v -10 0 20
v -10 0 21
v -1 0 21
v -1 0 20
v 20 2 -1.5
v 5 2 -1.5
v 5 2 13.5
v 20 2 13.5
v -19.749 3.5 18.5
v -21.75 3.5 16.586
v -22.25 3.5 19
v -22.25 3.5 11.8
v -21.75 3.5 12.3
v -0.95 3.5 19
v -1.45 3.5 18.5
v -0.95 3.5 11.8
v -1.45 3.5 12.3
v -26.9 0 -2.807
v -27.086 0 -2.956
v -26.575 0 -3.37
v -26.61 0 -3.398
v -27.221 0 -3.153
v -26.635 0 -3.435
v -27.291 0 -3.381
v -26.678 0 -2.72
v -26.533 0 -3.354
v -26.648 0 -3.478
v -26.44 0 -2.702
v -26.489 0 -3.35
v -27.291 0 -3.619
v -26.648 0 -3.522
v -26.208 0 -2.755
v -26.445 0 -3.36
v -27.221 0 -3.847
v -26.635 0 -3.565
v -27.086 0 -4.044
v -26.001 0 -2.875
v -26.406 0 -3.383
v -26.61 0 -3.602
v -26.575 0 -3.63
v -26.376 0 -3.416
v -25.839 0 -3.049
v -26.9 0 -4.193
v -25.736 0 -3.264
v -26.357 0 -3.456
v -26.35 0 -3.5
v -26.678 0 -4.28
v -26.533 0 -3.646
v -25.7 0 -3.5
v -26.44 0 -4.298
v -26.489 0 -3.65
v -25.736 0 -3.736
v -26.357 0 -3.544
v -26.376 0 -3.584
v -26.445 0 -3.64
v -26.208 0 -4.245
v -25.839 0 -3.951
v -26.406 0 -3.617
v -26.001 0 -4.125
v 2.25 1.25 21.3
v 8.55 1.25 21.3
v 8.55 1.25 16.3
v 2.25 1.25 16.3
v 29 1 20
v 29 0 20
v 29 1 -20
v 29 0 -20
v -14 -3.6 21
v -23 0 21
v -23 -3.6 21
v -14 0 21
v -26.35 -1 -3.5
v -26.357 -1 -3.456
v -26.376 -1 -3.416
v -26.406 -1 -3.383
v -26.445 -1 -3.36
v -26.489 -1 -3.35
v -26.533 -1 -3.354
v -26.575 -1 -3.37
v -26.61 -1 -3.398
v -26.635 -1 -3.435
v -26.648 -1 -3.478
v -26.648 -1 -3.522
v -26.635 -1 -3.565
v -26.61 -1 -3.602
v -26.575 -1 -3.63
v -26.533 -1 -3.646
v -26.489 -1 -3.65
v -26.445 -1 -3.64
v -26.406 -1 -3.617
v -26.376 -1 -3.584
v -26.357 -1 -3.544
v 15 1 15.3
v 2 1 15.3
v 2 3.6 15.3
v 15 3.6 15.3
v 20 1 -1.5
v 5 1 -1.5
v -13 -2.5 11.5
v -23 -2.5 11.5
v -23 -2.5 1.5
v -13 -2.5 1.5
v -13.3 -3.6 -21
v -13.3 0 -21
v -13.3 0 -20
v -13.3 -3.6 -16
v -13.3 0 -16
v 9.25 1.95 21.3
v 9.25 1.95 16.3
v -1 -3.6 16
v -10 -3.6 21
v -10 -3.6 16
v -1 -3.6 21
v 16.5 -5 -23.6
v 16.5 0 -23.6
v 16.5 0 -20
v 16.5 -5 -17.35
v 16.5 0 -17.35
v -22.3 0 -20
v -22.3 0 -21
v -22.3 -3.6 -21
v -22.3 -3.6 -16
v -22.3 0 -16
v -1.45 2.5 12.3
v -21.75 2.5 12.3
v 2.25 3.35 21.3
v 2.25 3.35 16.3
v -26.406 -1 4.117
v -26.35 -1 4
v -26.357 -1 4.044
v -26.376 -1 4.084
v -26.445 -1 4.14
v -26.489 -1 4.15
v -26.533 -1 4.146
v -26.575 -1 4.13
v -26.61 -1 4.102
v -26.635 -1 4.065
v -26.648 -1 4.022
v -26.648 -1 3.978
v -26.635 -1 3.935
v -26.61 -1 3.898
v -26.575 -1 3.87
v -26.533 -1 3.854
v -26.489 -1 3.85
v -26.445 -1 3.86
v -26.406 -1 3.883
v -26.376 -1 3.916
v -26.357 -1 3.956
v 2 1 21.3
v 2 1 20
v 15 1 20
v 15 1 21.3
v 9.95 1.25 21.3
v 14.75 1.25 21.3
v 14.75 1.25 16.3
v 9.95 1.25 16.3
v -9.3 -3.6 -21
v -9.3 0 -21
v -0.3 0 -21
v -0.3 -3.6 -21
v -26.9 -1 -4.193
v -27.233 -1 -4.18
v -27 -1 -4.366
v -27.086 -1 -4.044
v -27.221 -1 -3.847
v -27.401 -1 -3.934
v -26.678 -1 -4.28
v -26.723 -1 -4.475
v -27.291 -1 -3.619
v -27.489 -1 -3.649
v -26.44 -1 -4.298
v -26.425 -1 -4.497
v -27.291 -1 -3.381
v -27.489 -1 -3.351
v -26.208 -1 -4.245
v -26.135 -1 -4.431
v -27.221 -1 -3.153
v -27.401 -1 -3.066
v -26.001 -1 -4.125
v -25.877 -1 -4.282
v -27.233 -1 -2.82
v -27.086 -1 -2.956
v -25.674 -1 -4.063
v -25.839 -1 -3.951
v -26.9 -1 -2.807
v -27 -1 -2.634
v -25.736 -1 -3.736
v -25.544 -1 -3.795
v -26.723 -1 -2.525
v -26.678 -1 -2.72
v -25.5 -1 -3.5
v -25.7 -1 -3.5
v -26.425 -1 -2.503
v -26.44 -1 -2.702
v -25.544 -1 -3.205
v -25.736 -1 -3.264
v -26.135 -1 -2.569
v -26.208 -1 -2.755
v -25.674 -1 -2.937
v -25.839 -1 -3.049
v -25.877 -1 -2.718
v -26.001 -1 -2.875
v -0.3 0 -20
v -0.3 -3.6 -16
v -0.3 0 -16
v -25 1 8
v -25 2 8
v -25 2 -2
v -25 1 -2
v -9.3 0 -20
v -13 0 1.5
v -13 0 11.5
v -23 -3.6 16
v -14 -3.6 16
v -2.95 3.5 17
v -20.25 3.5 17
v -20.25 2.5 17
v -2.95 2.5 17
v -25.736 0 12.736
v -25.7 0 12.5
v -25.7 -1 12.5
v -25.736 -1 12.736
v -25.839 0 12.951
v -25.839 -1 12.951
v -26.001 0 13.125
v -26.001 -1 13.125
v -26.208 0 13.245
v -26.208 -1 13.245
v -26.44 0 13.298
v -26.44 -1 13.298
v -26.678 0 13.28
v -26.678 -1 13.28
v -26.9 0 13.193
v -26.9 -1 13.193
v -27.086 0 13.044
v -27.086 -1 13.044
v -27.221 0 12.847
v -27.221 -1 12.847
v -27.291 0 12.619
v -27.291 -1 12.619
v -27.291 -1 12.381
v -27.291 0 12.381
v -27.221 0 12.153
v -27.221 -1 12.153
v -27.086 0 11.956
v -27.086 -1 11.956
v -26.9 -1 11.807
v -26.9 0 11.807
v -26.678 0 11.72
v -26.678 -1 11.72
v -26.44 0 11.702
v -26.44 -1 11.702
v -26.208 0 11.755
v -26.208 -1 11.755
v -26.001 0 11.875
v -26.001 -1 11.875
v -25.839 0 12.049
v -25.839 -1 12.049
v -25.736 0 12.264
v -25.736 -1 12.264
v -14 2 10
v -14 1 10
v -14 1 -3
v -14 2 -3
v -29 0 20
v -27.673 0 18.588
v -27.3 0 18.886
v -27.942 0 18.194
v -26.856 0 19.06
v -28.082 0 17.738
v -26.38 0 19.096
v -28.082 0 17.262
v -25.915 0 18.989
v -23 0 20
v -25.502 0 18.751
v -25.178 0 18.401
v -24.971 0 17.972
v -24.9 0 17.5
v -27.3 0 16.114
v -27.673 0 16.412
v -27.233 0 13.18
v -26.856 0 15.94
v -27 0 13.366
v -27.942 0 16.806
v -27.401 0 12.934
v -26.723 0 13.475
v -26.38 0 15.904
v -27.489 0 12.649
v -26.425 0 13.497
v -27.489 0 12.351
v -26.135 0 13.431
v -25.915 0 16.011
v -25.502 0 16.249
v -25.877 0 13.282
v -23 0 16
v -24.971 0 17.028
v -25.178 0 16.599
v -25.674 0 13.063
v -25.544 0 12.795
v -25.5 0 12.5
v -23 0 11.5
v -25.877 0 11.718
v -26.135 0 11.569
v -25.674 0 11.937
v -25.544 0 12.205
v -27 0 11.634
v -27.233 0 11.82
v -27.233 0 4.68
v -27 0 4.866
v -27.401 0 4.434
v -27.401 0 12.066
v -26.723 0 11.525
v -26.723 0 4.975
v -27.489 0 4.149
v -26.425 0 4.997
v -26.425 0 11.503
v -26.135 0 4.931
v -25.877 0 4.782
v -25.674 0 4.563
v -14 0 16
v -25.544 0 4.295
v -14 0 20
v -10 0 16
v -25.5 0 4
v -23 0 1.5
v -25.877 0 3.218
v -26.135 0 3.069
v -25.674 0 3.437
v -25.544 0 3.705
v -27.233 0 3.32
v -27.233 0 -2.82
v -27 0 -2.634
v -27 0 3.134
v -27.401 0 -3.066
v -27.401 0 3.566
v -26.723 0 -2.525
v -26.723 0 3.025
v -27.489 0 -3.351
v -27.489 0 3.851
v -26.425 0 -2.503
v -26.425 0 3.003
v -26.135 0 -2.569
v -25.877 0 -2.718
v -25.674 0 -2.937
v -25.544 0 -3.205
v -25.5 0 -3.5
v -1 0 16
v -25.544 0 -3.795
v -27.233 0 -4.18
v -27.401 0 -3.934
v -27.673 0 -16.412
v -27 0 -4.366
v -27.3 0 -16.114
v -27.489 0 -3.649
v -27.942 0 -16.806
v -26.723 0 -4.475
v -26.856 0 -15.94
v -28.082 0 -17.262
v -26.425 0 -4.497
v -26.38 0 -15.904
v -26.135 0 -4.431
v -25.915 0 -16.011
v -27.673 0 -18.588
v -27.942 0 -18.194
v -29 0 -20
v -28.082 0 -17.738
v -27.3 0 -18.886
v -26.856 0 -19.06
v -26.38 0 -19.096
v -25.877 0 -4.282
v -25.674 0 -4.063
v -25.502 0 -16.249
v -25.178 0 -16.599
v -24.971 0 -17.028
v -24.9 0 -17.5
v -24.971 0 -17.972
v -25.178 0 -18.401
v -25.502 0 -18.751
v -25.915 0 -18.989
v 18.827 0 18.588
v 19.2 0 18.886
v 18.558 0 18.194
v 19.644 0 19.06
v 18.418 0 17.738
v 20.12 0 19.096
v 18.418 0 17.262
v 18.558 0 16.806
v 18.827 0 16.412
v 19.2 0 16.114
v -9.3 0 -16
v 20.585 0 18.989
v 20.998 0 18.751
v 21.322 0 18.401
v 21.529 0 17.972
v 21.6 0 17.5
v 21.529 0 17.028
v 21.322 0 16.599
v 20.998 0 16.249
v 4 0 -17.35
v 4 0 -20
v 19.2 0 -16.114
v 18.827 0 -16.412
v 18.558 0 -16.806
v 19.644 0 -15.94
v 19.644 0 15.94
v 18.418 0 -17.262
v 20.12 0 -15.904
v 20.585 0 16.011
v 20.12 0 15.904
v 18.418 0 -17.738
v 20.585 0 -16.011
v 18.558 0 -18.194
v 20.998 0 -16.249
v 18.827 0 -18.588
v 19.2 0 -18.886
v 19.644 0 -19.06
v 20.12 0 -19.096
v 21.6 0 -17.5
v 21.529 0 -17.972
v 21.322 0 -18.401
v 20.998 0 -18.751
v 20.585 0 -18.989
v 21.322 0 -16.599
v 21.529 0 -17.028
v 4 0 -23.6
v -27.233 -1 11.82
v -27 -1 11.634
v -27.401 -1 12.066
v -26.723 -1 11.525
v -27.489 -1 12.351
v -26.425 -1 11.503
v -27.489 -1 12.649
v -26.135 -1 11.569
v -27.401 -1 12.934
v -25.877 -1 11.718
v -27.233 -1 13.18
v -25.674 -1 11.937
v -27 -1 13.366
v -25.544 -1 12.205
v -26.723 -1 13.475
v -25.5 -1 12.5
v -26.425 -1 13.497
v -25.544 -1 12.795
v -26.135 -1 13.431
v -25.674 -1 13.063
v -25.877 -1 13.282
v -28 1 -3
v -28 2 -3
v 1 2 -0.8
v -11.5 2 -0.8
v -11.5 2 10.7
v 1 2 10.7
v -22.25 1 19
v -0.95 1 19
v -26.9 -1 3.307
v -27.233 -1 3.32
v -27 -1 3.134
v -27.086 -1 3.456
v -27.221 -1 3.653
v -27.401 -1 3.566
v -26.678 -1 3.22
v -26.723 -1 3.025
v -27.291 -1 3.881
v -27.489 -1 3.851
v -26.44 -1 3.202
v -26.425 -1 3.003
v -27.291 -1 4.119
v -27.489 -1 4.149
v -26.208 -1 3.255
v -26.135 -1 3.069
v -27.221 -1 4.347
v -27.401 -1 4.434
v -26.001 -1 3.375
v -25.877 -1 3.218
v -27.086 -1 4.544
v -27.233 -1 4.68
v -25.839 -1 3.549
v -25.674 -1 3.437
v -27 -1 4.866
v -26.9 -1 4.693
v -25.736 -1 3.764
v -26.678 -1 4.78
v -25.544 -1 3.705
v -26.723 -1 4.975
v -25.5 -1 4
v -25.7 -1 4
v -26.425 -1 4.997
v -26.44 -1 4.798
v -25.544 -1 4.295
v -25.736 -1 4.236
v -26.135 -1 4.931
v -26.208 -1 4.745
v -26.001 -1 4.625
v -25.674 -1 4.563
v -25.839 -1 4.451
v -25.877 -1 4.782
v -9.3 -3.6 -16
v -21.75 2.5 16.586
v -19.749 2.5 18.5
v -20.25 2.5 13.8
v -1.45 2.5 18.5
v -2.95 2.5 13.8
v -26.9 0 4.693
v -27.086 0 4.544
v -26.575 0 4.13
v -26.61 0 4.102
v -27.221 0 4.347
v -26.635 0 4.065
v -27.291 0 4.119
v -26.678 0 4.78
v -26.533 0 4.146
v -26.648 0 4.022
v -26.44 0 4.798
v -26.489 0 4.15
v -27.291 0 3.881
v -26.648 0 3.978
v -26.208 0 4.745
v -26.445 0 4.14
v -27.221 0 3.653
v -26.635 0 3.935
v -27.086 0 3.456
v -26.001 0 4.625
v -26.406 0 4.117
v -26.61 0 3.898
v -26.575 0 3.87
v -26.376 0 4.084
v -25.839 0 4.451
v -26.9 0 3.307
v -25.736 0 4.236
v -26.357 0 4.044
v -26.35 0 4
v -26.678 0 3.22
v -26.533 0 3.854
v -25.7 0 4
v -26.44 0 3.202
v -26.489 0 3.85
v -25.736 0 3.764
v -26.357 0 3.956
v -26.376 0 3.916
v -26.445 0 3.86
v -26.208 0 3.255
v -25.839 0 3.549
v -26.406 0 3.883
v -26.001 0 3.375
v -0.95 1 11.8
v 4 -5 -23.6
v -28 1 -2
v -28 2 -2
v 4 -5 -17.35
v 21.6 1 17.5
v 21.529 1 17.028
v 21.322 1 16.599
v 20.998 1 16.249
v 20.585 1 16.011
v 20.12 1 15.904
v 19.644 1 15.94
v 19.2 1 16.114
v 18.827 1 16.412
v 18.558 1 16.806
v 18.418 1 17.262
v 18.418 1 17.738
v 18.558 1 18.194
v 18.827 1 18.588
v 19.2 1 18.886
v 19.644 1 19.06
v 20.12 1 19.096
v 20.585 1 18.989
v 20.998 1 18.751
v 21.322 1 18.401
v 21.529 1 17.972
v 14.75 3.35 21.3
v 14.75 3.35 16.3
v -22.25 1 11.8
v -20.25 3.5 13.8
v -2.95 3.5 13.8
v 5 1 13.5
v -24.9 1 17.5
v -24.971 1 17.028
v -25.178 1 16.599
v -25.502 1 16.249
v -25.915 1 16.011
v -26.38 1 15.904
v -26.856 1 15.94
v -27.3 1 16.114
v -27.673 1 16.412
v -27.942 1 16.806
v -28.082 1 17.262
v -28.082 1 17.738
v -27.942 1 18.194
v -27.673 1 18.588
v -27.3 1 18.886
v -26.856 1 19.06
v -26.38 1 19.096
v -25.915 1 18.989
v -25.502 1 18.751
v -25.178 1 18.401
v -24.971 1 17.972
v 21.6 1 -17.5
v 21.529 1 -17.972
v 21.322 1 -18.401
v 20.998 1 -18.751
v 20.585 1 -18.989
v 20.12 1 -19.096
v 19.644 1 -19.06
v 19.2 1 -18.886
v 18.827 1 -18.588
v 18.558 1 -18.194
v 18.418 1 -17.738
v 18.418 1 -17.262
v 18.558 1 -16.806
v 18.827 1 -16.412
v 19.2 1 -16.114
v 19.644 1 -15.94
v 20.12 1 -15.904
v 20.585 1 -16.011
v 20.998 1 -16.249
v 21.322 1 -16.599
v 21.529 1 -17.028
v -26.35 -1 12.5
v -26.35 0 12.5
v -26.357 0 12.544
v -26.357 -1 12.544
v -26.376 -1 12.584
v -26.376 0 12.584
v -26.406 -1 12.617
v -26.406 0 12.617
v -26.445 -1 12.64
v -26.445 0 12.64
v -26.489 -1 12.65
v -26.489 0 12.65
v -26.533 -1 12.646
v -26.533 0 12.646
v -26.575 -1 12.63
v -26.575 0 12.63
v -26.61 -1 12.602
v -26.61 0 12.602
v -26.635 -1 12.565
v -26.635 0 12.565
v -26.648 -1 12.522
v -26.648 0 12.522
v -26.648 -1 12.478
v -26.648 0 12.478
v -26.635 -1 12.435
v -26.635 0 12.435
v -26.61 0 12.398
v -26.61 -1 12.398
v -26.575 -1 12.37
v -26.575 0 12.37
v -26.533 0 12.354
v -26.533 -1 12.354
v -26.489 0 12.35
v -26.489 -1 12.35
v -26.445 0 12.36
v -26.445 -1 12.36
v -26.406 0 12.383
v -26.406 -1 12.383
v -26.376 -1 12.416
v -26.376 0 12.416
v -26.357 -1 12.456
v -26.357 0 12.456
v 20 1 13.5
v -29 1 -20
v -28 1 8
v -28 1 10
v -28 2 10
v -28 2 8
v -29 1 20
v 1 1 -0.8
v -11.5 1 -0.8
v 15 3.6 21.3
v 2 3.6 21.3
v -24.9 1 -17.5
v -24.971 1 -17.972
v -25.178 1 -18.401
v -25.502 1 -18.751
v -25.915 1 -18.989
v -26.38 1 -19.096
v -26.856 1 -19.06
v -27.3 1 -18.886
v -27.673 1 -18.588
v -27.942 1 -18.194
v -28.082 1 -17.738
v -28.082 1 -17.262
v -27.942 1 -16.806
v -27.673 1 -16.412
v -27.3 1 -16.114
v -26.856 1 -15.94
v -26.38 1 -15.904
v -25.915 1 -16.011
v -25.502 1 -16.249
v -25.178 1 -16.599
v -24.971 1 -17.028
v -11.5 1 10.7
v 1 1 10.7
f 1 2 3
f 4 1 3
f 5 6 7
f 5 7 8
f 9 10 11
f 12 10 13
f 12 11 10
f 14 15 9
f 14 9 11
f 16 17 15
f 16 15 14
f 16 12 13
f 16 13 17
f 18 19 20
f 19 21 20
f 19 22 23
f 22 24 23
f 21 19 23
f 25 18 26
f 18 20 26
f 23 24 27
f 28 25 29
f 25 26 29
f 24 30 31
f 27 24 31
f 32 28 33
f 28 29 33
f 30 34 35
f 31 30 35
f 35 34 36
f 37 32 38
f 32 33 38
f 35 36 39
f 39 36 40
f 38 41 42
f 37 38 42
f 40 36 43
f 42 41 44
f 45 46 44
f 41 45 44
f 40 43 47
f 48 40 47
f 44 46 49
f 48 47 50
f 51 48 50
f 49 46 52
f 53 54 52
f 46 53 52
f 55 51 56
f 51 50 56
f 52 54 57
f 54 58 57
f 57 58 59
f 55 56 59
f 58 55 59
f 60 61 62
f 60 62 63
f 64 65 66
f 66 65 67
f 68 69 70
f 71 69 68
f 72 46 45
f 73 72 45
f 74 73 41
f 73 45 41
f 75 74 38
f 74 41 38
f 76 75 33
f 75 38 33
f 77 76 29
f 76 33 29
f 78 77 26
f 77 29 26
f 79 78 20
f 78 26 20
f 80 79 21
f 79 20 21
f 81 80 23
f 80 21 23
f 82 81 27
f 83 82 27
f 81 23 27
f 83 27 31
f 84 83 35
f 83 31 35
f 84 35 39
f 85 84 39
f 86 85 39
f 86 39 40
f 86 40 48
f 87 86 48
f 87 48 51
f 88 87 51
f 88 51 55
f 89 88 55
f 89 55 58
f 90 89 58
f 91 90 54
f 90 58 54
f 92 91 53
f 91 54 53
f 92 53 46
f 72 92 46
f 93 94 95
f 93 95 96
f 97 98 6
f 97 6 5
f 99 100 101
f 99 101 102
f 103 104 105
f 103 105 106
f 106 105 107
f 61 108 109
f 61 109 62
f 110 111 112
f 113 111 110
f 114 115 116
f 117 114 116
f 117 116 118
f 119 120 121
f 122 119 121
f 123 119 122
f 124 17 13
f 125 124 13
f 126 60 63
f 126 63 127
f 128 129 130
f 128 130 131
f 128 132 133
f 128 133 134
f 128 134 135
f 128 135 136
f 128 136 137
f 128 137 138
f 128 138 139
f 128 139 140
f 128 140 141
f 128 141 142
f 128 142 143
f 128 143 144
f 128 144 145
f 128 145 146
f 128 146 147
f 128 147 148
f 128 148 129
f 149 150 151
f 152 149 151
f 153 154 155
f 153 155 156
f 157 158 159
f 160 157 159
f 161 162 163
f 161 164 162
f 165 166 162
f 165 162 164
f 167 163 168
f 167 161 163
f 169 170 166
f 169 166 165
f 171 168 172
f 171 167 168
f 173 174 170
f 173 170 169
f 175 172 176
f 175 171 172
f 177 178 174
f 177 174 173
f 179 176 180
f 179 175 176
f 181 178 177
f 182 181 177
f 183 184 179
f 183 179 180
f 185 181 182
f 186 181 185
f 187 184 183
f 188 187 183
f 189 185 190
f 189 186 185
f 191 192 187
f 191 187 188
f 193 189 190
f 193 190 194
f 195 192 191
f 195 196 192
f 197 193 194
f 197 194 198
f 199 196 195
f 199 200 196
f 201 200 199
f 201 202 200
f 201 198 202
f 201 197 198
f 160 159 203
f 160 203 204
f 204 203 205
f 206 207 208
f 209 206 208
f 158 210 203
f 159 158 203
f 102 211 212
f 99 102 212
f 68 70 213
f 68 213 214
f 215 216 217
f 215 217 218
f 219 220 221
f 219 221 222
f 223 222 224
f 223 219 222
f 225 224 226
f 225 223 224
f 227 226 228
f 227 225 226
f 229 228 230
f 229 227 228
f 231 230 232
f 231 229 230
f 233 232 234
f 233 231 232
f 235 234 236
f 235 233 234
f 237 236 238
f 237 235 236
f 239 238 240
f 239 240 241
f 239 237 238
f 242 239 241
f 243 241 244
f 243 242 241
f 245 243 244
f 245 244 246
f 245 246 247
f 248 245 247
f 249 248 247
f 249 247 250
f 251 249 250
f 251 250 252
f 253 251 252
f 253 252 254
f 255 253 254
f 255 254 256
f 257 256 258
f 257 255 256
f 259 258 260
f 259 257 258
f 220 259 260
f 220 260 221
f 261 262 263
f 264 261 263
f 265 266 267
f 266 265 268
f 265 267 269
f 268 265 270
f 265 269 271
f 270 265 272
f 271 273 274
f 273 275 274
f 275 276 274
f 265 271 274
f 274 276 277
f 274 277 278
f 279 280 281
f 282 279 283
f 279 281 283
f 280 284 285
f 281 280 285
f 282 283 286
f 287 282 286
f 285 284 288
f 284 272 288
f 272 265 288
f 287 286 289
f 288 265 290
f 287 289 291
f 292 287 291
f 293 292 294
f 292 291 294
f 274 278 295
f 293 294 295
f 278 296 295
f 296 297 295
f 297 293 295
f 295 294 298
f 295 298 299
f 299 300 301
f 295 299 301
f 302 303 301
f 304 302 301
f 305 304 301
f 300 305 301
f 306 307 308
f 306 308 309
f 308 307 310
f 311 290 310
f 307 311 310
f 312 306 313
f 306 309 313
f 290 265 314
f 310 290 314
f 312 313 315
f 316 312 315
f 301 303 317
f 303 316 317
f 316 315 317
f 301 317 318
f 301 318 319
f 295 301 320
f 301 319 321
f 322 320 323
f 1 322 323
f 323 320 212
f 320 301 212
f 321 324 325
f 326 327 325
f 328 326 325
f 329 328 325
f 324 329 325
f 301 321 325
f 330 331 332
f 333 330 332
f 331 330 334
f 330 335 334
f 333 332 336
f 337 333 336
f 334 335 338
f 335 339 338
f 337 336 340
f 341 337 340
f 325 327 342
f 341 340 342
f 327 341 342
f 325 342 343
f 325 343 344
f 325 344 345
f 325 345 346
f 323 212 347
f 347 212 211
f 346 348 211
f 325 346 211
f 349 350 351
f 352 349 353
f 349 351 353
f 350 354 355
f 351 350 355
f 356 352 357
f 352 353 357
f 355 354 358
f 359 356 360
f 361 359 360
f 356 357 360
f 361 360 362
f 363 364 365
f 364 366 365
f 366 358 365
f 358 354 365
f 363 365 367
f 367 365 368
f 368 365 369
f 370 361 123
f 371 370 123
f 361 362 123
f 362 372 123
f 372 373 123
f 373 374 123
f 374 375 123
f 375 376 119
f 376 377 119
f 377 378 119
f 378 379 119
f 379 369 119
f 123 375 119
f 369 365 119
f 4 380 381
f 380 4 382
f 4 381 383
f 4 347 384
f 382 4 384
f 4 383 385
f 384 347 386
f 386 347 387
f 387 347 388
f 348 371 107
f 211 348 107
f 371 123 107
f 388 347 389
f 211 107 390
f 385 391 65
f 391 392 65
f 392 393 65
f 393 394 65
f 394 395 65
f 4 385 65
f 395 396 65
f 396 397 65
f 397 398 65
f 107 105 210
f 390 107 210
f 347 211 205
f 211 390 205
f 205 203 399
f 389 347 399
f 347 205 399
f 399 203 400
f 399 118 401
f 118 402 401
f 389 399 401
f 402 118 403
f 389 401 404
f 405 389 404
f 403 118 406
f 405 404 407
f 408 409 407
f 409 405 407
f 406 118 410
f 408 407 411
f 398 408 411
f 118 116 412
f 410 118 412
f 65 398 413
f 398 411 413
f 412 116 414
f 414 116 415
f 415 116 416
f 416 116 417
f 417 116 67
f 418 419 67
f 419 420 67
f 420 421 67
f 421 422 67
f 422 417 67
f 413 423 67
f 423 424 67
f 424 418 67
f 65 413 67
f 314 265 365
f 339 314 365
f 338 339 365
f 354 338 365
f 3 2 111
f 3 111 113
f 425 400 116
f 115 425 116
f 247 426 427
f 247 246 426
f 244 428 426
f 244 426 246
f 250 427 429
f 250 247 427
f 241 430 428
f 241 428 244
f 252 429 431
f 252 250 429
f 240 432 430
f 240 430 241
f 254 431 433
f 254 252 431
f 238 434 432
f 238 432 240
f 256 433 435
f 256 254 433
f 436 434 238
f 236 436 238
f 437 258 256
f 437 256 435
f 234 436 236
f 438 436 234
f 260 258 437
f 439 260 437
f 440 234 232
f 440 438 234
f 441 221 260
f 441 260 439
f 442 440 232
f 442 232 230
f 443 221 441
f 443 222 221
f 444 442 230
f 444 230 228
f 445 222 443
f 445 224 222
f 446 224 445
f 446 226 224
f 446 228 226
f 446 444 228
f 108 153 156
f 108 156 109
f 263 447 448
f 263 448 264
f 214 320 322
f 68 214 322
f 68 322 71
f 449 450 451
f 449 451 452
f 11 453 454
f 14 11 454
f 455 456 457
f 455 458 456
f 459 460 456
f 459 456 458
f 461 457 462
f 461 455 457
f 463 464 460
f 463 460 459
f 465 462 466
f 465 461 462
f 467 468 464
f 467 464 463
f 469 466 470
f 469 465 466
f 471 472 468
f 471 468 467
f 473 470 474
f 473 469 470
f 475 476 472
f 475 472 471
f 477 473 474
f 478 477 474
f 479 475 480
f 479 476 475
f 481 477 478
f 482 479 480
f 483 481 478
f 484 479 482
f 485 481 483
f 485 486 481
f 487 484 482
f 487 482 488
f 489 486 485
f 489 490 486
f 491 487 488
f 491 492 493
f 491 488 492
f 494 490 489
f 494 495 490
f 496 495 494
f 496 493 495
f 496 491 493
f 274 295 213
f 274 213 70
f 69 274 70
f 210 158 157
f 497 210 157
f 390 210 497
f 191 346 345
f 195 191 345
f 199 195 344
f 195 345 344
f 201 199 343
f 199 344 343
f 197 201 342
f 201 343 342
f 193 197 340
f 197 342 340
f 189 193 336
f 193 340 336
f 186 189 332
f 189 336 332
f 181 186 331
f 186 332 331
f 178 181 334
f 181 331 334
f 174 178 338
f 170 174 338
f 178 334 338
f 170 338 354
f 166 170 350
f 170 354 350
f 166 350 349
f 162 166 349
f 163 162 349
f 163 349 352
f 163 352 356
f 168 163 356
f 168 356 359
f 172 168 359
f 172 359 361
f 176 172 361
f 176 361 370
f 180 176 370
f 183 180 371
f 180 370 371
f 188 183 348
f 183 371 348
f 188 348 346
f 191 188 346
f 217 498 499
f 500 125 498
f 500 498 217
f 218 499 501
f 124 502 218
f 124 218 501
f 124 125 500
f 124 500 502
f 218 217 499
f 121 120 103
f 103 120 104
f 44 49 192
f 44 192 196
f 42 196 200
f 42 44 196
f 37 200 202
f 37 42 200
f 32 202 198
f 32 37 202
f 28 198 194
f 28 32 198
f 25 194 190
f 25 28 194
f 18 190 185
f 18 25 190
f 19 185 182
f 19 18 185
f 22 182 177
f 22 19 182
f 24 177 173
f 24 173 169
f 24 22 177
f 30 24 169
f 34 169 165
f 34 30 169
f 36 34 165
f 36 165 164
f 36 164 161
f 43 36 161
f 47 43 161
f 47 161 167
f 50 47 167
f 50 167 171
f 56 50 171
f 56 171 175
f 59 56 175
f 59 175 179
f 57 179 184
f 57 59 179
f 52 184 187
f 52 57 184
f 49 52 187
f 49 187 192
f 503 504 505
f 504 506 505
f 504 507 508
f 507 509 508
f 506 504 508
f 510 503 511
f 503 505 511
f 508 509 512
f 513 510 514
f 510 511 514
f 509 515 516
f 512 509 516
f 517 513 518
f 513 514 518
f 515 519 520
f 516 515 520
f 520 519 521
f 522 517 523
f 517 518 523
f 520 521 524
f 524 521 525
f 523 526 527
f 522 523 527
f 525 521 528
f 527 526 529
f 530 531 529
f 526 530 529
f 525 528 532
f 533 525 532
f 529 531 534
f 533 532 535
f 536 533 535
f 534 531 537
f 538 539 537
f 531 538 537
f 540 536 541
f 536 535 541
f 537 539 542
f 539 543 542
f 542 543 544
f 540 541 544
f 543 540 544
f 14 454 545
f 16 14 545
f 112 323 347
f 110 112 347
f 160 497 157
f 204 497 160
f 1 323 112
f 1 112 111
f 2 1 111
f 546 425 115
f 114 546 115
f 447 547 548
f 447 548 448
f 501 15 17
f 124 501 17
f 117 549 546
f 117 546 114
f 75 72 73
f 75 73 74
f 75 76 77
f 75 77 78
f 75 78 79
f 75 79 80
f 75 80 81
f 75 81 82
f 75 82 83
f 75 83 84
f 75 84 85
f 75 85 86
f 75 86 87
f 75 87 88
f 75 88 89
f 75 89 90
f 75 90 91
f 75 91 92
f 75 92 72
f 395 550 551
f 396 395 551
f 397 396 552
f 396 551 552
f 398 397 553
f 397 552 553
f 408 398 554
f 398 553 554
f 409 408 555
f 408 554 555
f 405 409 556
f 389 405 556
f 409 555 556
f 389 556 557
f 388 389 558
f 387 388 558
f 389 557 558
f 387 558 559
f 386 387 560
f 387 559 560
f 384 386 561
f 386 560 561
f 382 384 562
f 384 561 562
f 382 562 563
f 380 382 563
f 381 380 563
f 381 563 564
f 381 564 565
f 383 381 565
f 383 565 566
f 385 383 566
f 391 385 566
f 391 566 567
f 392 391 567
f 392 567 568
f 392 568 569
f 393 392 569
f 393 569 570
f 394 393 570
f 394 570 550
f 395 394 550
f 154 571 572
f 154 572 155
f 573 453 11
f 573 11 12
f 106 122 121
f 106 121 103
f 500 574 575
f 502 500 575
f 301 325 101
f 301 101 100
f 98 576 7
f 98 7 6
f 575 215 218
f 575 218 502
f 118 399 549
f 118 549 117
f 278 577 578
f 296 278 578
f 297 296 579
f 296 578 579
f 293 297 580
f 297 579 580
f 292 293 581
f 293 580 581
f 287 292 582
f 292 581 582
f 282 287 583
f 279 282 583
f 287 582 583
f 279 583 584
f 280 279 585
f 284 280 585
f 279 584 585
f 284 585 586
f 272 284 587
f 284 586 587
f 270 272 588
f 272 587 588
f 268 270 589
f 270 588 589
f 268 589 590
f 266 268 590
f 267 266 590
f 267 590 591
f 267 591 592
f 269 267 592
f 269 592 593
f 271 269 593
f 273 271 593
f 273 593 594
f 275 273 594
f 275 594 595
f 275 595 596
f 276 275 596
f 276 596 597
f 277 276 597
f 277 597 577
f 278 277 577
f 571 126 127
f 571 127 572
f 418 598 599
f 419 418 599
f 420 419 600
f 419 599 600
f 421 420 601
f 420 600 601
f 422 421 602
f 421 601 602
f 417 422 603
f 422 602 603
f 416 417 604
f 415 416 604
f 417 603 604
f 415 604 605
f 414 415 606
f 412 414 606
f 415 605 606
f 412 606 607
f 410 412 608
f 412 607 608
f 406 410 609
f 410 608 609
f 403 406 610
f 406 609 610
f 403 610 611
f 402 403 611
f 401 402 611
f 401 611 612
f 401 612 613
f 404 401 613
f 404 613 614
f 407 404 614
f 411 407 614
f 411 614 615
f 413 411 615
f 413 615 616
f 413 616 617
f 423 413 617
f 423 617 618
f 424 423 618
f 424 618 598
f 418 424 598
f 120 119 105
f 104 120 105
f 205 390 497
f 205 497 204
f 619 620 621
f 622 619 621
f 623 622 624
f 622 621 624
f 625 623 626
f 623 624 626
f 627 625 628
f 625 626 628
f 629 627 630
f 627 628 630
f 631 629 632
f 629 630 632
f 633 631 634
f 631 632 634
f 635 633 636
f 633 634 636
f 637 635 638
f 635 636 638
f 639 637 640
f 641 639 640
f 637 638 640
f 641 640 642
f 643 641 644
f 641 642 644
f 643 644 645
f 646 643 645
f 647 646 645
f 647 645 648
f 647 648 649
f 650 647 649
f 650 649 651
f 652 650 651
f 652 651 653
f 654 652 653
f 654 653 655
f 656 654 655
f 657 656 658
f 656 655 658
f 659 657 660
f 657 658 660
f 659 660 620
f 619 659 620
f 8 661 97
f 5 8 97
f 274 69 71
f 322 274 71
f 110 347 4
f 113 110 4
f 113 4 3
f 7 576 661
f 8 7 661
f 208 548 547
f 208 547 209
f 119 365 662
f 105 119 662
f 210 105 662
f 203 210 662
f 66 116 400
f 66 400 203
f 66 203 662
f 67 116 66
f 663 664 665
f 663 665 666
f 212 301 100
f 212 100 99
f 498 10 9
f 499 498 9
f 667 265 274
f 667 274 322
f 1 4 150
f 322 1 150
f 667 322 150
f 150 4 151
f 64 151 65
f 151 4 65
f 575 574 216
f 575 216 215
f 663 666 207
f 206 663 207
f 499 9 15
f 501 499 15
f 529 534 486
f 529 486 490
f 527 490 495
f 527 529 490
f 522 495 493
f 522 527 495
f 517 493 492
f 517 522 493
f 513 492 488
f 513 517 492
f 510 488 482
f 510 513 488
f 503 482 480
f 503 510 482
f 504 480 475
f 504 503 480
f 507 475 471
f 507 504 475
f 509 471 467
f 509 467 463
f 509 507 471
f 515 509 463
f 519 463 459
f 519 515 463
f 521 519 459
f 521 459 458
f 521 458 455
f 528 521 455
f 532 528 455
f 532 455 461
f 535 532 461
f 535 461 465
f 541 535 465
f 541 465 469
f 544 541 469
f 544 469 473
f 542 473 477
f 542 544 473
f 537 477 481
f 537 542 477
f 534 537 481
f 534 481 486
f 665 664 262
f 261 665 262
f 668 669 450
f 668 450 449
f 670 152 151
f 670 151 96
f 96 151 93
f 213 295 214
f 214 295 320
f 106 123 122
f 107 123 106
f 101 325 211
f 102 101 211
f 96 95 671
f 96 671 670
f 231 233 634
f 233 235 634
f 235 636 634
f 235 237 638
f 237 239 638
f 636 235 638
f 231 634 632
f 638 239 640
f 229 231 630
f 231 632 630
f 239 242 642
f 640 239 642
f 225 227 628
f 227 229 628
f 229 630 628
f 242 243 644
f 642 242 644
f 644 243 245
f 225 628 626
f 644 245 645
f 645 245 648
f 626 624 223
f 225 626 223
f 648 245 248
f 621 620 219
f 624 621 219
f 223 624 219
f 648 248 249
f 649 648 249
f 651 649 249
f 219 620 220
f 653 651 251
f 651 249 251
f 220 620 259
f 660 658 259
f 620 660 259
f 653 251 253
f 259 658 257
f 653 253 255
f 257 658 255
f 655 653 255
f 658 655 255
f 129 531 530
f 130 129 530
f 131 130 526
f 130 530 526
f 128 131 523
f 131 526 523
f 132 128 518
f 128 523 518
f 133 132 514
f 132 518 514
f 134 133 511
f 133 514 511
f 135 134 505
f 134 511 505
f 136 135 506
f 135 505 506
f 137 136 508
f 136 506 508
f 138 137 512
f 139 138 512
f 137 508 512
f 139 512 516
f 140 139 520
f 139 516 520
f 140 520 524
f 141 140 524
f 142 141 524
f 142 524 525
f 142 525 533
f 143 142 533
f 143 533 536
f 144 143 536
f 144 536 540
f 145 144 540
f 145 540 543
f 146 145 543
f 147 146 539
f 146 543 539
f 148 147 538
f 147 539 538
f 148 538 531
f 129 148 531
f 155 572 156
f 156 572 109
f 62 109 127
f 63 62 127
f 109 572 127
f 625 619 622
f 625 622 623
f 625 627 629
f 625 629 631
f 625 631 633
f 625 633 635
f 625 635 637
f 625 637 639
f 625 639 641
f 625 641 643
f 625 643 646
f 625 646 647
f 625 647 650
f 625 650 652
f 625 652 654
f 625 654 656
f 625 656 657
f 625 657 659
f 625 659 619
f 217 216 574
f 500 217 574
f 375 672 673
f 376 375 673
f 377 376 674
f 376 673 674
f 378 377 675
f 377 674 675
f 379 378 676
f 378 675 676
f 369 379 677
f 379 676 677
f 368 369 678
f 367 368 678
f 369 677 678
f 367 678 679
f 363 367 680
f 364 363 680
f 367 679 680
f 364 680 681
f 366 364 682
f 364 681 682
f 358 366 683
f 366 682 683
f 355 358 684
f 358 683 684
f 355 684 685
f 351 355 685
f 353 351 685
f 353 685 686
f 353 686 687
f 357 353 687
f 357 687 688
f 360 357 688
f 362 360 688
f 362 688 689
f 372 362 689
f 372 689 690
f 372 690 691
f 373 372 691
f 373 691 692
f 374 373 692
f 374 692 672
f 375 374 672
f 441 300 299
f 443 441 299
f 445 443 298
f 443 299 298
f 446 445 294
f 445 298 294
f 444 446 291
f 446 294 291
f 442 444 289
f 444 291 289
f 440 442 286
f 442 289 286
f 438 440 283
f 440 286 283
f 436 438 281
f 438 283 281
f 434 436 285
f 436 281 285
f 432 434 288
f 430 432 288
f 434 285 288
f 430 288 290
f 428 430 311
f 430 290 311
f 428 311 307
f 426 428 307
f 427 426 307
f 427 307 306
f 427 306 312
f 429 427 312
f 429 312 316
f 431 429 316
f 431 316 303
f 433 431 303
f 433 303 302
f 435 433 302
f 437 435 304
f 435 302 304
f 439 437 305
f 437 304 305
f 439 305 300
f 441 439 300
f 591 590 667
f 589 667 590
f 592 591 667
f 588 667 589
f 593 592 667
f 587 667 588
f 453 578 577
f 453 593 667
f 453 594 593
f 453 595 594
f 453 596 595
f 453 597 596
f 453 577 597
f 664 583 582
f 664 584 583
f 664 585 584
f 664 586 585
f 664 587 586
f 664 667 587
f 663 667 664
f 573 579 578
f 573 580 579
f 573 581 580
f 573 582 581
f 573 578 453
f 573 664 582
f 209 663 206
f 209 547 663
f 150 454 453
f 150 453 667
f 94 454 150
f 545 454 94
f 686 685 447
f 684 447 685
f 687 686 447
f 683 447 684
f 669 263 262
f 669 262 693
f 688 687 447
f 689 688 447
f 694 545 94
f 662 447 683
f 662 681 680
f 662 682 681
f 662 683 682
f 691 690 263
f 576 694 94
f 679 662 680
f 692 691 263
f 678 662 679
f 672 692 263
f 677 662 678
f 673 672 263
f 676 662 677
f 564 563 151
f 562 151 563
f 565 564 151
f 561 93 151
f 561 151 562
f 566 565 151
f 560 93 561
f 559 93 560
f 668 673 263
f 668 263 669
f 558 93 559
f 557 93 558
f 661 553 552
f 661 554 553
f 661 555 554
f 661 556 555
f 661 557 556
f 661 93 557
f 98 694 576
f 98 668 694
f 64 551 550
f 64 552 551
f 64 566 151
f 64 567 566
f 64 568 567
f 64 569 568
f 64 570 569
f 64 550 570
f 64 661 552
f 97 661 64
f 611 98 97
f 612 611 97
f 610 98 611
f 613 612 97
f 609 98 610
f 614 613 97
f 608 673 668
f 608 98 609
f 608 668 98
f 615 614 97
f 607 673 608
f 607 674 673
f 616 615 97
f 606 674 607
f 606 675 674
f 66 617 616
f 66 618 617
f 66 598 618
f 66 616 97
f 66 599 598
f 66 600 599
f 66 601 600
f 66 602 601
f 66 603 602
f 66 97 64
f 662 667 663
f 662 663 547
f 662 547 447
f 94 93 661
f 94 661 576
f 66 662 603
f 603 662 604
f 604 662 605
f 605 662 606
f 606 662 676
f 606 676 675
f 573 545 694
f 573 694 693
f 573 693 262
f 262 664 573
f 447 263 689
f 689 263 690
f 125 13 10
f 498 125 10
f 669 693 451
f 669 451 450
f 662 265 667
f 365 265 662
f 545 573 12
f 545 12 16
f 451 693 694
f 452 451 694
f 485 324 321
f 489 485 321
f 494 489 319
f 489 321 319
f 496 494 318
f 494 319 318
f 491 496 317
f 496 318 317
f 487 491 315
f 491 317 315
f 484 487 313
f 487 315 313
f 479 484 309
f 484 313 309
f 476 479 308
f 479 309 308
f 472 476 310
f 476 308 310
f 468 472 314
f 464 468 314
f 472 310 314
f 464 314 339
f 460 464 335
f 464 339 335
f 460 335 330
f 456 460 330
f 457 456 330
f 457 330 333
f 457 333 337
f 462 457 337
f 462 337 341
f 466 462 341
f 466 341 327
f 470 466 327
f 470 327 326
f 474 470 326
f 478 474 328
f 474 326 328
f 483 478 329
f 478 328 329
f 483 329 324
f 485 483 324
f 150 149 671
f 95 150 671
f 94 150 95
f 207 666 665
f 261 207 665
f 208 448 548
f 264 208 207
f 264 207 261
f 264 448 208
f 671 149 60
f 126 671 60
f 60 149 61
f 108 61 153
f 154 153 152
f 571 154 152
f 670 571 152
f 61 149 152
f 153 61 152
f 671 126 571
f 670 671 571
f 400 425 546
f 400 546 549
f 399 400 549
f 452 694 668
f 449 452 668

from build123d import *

# Parameters (mm, degrees)
SKETCH1_W            = 58
SKETCH1_H            = 40
BOSS_EXTRUDE1_DEPTH  = 1
SKETCH2_W            = 14
SKETCH2_H            = 13
BOSS_EXTRUDE2_DEPTH  = 1
SKETCH3_W            = 3
SKETCH3_H            = 10
CUT_EXTRUDE1_DEPTH   = 1
SKETCH4_W            = 12.5
SKETCH4_H            = 11.5
SKETCH4_W_2          = 15
SKETCH4_H_2          = 15
BOSS_EXTRUDE3_DEPTH  = 1
SKETCH5_W            = 13
SKETCH5_H            = 6
BOSS_EXTRUDE4_DEPTH  = 2.6
CUT_EXTRUDE2_DEPTH   = 5
SKETCH7_W            = 21.3
SKETCH7_H            = 7.2
BOSS_EXTRUDE5_DEPTH  = 2.5
SKETCH8_W            = 17.3
SKETCH8_H            = 3.2
CUT_EXTRUDE3_DEPTH   = 1
SKETCH9_R            = 1.6
CUT_EXTRUDE4_DEPTH   = 2
SKETCH10_W           = 9
SKETCH10_H           = 5
BOSS_EXTRUDE6_DEPTH  = 3.6
SKETCH11_W           = 12.5
SKETCH11_H           = 6.25
BOSS_EXTRUDE7_DEPTH  = 5
SKETCH12_W           = 10
SKETCH12_H           = 10
BOSS_EXTRUDE8_DEPTH  = 2.5
SKETCH13_R           = 1
SKETCH13_R_2         = 0.8
BOSS_EXTRUDE9_DEPTH  = 1
SKETCH14_R           = 0.15
BOSS_EXTRUDE10_DEPTH = 1


with BuildPart() as part:
    # Sketch1 → Boss-Extrude1 (new body)
    with BuildSketch(Plane(origin=(0, 0, 0), x_dir=(1, 0, 0), z_dir=(0, 1, 0))):
        Rectangle(SKETCH1_W, SKETCH1_H)
    extrude(amount=BOSS_EXTRUDE1_DEPTH)

    # Sketch2 → Boss-Extrude2 (add)
    with BuildSketch(Plane(origin=(0, 1, 0), x_dir=(1, 0, 0), z_dir=(0, 1, 0))):
        with Locations((-21, -3.5)):
            Rectangle(SKETCH2_W, SKETCH2_H)
    extrude(amount=BOSS_EXTRUDE2_DEPTH)

    # Sketch3 → Cut-Extrude1 (cut)
    with BuildSketch(Plane(origin=(0, 2, 0), x_dir=(1, 0, 0), z_dir=(0, 1, 0))):
        with Locations((-26.5, -3)):
            Rectangle(SKETCH3_W, SKETCH3_H)
    extrude(amount=-CUT_EXTRUDE1_DEPTH, mode=Mode.SUBTRACT)

    # Sketch4 → Boss-Extrude3 (add)
    with BuildSketch(Plane(origin=(0, 1, 0), x_dir=(1, 0, 0), z_dir=(0, 1, 0))):
        with Locations((-5.25, -4.95)):
            Rectangle(SKETCH4_W, SKETCH4_H)
        with Locations((12.5, -6)):
            Rectangle(SKETCH4_W_2, SKETCH4_H_2)
    extrude(amount=BOSS_EXTRUDE3_DEPTH)

    # Sketch5 → Boss-Extrude4 (add)
    with BuildSketch(Plane(origin=(0, 1, 0), x_dir=(1, 0, 0), z_dir=(0, 1, 0))):
        with Locations((8.5, -18.3)):
            Rectangle(SKETCH5_W, SKETCH5_H)
    extrude(amount=BOSS_EXTRUDE4_DEPTH)

    # Sketch6 → Cut-Extrude2 (cut)
    with BuildSketch(Plane.XY.offset(21.3)):
        Polygon((2.25, 3.35), (14.75, 3.35), (14.75, 1.25), (9.95, 1.25), (9.25, 1.95), (8.55, 1.25), (2.25, 1.25), align=None)
    extrude(amount=-CUT_EXTRUDE2_DEPTH, mode=Mode.SUBTRACT)

    # Sketch7 → Boss-Extrude5 (add)
    with BuildSketch(Plane(origin=(0, 1, 0), x_dir=(1, 0, 0), z_dir=(0, 1, 0))):
        with Locations((-11.6, -15.4)):
            Rectangle(SKETCH7_W, SKETCH7_H)
    extrude(amount=BOSS_EXTRUDE5_DEPTH)

    # Sketch8 → Cut-Extrude3 (cut)
    with BuildSketch(Plane(origin=(0, 3.5, 0), x_dir=(1, 0, 0), z_dir=(0, 1, 0))):
        Polygon((-21.75, -12.3), (-21.75, -16.586355197), (-19.749371343, -18.5), (-1.45, -18.5), (-1.45, -12.3), align=None)
        with Locations((-11.6, -15.4)):
            Rectangle(SKETCH8_W, SKETCH8_H, mode=Mode.SUBTRACT)
    extrude(amount=-CUT_EXTRUDE3_DEPTH, mode=Mode.SUBTRACT)

    # Sketch9 → Cut-Extrude4 (cut, through all)
    with BuildSketch(Plane(origin=(0, 1, 0), x_dir=(1, 0, 0), z_dir=(0, 1, 0))):
        with Locations((-26.5, 17.5)):
            Circle(SKETCH9_R)
        with Locations((20, 17.5)):
            Circle(SKETCH9_R)
        with Locations((20, -17.5)):
            Circle(SKETCH9_R)
        with Locations((-26.5, -17.5)):
            Circle(SKETCH9_R)
    extrude(amount=-CUT_EXTRUDE4_DEPTH, mode=Mode.SUBTRACT)

    # Sketch10 → Boss-Extrude6 (add)
    with BuildSketch(Plane.XZ):
        with Locations((-18.5, 18.5)):
            Rectangle(SKETCH10_W, SKETCH10_H)
        with Locations((-5.5, 18.5)):
            Rectangle(SKETCH10_W, SKETCH10_H)
        with Locations((-17.8, -18.5)):
            Rectangle(SKETCH10_W, SKETCH10_H)
        with Locations((-4.8, -18.5)):
            Rectangle(SKETCH10_W, SKETCH10_H)
    extrude(amount=BOSS_EXTRUDE6_DEPTH)

    # Sketch11 → Boss-Extrude7 (add)
    with BuildSketch(Plane.XZ):
        with Locations((10.25, -20.475)):
            Rectangle(SKETCH11_W, SKETCH11_H)
    extrude(amount=BOSS_EXTRUDE7_DEPTH)

    # Sketch12 → Boss-Extrude8 (add)
    with BuildSketch(Plane.XZ):
        with Locations((-18, 6.5)):
            Rectangle(SKETCH12_W, SKETCH12_H)
    extrude(amount=BOSS_EXTRUDE8_DEPTH)

    # Sketch13 → Boss-Extrude9 (add)
    with BuildSketch(Plane.XZ):
        with Locations((-26.5, 12.5)):
            Circle(SKETCH13_R)
        with Locations((-26.5, 12.5)):
            Circle(SKETCH13_R_2, mode=Mode.SUBTRACT)
        with Locations((-26.5, 4)):
            Circle(SKETCH13_R)
        with Locations((-26.5, 4)):
            Circle(SKETCH13_R_2, mode=Mode.SUBTRACT)
        with Locations((-26.5, -3.5)):
            Circle(SKETCH13_R)
        with Locations((-26.5, -3.5)):
            Circle(SKETCH13_R_2, mode=Mode.SUBTRACT)
    extrude(amount=BOSS_EXTRUDE9_DEPTH)

    # Sketch14 → Boss-Extrude10 (add)
    with BuildSketch(Plane.XZ):
        with Locations((-26.5, 12.5)):
            Circle(SKETCH14_R)
        with Locations((-26.5, 4)):
            Circle(SKETCH14_R)
        with Locations((-26.5, -3.5)):
            Circle(SKETCH14_R)
    extrude(amount=BOSS_EXTRUDE10_DEPTH)


solid = part.part
